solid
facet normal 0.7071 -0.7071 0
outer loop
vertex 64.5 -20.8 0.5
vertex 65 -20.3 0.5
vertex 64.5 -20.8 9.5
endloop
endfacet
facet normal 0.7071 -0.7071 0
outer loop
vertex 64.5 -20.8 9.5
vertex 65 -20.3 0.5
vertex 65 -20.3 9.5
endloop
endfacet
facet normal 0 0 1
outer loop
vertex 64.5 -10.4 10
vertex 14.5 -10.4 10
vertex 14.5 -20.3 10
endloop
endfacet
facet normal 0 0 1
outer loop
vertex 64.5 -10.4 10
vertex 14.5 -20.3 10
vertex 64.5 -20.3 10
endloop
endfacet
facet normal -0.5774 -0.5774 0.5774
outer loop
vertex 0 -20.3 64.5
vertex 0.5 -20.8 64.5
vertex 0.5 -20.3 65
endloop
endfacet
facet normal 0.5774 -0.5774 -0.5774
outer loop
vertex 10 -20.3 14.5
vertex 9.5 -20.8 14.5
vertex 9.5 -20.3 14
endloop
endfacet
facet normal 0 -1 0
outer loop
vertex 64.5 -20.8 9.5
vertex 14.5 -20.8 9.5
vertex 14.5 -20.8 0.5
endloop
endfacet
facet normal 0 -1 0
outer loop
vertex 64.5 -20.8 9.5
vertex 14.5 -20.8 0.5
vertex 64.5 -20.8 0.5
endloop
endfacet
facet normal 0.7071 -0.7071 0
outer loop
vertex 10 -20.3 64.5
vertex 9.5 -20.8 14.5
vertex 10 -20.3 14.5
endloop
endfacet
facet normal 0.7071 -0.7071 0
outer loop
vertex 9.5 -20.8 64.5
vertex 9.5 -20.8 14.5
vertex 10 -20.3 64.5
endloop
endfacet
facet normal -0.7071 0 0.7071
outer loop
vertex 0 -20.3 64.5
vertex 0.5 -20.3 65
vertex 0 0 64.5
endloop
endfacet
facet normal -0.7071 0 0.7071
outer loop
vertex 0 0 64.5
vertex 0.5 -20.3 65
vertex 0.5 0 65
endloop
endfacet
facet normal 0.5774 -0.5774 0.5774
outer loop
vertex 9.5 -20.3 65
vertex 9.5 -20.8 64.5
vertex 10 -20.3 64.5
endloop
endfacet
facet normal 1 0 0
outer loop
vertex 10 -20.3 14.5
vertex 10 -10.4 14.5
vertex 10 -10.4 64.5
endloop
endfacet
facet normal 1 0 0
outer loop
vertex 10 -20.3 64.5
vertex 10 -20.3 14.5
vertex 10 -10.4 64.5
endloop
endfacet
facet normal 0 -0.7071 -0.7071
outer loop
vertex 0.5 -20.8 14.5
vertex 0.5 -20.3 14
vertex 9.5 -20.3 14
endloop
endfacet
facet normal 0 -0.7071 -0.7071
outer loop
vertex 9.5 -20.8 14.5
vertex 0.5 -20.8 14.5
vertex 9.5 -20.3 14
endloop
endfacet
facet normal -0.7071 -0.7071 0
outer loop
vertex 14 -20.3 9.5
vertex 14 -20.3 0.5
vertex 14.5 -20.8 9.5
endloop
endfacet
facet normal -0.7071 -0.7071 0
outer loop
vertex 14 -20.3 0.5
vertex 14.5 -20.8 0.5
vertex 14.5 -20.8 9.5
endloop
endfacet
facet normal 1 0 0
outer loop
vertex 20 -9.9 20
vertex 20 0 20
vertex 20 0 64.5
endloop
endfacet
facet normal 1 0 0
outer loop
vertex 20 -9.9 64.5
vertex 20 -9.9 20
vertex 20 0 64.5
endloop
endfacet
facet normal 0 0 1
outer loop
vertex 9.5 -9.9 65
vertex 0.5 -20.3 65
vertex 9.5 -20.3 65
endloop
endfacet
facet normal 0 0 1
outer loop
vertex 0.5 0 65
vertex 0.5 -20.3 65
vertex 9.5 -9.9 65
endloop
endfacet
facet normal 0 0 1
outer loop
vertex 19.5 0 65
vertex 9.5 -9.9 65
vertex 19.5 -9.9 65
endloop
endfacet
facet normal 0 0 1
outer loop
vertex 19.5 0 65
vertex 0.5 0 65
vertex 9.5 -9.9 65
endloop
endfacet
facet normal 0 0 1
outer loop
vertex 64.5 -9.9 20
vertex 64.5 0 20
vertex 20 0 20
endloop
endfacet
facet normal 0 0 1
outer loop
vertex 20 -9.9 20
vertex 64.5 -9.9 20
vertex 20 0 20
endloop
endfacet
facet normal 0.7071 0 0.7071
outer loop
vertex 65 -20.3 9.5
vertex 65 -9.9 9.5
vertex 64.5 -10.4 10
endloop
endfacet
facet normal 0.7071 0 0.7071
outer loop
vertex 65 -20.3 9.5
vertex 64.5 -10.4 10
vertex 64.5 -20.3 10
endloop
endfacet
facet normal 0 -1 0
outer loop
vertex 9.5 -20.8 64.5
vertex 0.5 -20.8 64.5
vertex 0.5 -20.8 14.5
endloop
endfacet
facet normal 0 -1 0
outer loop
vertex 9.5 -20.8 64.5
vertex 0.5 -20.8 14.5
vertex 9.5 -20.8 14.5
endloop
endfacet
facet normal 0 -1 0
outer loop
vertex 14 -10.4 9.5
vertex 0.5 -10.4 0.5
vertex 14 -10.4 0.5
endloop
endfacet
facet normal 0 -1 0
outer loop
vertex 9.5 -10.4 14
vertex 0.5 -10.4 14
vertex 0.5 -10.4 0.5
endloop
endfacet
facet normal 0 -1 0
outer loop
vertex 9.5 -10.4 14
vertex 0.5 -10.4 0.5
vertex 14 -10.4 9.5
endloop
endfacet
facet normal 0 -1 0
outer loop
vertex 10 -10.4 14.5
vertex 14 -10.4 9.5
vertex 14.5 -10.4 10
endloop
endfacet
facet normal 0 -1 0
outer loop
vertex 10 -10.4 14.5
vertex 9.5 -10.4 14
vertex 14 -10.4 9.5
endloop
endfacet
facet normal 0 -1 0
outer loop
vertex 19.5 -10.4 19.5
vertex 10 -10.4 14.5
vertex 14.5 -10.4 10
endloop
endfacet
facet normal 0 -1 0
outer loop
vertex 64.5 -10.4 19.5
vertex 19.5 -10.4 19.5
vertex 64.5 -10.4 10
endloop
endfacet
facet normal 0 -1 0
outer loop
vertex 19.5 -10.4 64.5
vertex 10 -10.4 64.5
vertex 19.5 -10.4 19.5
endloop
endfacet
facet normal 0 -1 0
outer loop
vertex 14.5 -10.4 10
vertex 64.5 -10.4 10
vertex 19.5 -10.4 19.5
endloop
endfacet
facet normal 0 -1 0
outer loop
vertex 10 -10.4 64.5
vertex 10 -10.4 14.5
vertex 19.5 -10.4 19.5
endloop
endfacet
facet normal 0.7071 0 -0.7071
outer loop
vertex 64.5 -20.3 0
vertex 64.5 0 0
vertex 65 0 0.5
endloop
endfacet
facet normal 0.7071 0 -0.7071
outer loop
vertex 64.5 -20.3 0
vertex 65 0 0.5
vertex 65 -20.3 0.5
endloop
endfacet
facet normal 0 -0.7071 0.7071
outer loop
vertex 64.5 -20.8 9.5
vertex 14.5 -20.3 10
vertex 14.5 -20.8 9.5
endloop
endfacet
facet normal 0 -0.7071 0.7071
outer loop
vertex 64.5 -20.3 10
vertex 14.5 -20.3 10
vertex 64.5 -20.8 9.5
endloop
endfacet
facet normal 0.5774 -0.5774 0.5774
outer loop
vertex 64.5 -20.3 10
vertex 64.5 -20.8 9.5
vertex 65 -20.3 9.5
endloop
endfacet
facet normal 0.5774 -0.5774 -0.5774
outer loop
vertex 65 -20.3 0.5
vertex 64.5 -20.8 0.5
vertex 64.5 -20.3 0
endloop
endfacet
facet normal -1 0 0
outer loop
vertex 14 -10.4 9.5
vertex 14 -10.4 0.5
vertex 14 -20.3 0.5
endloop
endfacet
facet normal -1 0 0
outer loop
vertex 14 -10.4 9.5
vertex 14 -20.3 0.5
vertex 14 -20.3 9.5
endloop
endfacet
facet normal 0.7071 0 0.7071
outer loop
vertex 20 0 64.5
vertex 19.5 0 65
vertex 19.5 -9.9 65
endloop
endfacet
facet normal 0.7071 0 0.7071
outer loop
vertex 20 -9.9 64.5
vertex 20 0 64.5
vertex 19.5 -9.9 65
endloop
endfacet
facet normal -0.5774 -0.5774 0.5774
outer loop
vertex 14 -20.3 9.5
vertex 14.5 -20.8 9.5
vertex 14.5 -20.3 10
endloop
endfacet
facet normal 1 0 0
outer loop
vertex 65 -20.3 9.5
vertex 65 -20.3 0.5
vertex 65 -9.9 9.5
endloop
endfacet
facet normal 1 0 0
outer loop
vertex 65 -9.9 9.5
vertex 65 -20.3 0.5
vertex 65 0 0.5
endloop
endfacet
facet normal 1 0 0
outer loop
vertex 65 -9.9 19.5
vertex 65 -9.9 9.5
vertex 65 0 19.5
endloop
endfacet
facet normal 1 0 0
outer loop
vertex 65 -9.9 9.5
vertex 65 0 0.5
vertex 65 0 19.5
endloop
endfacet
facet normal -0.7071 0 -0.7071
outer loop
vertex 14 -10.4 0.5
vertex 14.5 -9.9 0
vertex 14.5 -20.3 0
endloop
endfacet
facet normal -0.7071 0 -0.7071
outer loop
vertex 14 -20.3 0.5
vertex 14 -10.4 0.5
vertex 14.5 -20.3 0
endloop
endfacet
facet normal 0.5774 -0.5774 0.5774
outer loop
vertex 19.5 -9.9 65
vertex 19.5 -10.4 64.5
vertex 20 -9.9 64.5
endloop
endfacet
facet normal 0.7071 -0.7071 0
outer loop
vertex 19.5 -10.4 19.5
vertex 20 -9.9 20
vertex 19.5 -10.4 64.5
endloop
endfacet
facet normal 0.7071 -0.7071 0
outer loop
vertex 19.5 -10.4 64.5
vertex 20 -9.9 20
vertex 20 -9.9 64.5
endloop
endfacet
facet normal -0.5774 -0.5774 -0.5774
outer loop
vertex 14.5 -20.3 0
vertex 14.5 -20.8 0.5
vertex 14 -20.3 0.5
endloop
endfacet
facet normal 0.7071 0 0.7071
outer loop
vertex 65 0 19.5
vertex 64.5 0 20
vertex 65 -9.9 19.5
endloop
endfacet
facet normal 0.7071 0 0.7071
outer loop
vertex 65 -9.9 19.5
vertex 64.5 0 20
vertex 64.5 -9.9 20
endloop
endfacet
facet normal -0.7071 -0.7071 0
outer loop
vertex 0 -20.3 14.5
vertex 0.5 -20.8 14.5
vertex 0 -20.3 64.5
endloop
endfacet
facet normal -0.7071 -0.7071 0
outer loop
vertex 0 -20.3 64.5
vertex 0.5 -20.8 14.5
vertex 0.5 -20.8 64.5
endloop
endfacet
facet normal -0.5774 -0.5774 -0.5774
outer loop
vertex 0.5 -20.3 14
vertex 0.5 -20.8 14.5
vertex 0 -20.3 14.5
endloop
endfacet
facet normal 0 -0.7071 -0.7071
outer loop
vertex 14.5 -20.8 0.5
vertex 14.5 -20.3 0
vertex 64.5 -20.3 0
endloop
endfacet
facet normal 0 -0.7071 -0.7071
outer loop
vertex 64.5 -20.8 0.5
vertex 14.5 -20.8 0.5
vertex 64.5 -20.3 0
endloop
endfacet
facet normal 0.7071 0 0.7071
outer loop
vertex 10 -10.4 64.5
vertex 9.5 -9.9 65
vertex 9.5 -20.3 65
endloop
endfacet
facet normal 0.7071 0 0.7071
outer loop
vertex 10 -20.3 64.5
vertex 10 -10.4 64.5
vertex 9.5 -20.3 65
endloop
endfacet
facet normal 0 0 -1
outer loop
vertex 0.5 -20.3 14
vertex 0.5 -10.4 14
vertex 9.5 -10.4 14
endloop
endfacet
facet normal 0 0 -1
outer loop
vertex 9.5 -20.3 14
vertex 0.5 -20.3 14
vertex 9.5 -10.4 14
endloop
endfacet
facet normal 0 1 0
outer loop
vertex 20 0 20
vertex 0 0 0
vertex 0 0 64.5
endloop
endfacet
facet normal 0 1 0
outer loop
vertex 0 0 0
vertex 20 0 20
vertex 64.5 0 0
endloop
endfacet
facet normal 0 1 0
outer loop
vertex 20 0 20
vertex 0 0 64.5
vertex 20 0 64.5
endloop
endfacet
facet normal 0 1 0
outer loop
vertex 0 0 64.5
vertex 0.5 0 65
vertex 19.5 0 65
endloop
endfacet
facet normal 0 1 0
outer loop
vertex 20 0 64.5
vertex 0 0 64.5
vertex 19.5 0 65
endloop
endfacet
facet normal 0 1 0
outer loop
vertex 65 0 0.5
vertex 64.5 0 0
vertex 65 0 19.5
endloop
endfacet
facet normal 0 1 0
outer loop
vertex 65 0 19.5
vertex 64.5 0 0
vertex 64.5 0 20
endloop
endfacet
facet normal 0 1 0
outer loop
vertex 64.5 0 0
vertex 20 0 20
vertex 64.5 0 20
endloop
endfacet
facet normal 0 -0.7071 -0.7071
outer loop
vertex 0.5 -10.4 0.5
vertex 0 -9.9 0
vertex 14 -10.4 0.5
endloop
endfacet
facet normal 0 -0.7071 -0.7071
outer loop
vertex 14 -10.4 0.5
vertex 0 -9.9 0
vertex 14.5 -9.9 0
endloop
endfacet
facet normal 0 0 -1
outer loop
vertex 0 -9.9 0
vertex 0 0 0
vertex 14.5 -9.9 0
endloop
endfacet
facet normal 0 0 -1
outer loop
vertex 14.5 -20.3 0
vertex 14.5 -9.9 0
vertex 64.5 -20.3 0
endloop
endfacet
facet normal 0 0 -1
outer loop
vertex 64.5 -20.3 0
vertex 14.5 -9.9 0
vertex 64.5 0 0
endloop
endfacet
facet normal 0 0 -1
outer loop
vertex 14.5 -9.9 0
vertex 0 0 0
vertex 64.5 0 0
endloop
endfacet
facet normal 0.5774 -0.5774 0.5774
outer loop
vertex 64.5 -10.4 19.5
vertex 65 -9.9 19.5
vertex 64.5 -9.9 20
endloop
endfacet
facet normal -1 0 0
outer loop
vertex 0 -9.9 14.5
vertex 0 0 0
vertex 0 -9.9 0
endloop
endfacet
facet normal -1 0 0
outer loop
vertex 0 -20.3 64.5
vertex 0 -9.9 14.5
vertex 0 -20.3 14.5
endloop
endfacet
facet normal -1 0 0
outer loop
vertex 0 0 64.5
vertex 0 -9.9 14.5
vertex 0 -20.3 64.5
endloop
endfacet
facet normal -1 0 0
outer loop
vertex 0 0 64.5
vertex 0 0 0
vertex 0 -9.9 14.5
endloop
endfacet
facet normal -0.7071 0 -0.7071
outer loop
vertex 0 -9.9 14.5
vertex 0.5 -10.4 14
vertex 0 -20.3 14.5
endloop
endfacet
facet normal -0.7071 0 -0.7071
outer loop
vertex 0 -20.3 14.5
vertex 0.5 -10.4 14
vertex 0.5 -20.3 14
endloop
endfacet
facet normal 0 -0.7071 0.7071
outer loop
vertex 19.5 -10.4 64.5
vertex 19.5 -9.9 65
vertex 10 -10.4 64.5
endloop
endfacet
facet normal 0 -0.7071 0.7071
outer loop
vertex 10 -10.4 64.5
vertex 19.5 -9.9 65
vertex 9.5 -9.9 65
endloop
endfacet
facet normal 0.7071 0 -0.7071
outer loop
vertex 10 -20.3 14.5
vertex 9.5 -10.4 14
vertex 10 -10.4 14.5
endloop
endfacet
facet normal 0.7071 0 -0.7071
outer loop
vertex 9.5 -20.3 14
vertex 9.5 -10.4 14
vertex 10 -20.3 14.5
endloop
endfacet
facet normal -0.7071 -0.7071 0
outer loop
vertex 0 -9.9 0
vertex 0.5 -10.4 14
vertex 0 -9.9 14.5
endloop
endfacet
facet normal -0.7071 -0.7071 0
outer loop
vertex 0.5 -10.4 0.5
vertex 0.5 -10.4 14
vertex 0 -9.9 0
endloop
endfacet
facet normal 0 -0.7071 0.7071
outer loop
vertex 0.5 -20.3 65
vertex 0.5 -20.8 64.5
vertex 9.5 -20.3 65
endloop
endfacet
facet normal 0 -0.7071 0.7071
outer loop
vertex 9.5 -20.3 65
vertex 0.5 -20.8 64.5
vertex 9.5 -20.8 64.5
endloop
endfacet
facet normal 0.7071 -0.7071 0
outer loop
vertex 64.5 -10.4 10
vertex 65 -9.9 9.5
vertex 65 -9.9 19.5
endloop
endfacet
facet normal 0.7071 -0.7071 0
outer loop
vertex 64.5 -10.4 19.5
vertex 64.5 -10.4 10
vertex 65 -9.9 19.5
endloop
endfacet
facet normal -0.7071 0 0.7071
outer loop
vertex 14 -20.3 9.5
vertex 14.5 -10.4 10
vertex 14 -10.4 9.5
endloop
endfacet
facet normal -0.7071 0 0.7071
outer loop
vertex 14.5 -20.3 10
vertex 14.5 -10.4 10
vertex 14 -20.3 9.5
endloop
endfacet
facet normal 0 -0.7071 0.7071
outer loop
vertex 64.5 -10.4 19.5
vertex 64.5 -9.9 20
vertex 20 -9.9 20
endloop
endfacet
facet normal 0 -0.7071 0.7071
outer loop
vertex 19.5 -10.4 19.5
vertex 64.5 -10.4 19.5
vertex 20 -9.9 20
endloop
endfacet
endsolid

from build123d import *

# Parameters (mm, degrees)
F1_DEPTH = 10.4
F2_W     = 10
F2_H     = 51
F2_W_2   = 51
F2_H_2   = 10
F3_DEPTH = 10.4
F4_SIZE  = 0.5


with BuildPart() as f1:
    # F0 (on Front) → F1 (new body)
    with BuildSketch(Plane.XZ):
        Polygon((0, 65), (0, 0), (65, 0), (65, 20), (20, 20), (20, 65), align=None)
    extrude(amount=F1_DEPTH)

    # F2 (on face) → F3 (join)
    with BuildSketch(Plane.XZ.offset(10.4)):
        with Locations((5, 39.5)):
            Rectangle(F2_W, F2_H)
        with Locations((39.5, 5)):
            Rectangle(F2_W_2, F2_H_2)
    extrude(amount=F3_DEPTH)

    # F4
    f4_edges = [f1.edges().sort_by_distance(p)[0] for p in [
        (20, -10.4, 42.5),
        (15, -10.4, 65),
        (5, -20.8, 65),
        (0, -20.8, 39.5),
        (5, -20.8, 14),
        (10, -20.8, 39.5),
        (14, -20.8, 5),
        (39.5, -20.8, 0),
        (65, -20.8, 5),
        (39.5, -20.8, 10),
        (65, -10.4, 15),
        (65, -15.6, 10),
        (10, -15.6, 65),
        (20, -5.2, 65),
        (65, -5.2, 20),
        (42.5, -10.4, 20),
        (0, -10.4, 7),
        (7, -10.4, 0),
        (14, -15.6, 0),
        (0, -15.6, 14),
        (10, -15.6, 14),
        (14, -15.6, 10),
        (0, -10.4, 65),
        (65, -10.4, 0),
    ]]
    chamfer(f4_edges, length=F4_SIZE)


solid = f1.part
